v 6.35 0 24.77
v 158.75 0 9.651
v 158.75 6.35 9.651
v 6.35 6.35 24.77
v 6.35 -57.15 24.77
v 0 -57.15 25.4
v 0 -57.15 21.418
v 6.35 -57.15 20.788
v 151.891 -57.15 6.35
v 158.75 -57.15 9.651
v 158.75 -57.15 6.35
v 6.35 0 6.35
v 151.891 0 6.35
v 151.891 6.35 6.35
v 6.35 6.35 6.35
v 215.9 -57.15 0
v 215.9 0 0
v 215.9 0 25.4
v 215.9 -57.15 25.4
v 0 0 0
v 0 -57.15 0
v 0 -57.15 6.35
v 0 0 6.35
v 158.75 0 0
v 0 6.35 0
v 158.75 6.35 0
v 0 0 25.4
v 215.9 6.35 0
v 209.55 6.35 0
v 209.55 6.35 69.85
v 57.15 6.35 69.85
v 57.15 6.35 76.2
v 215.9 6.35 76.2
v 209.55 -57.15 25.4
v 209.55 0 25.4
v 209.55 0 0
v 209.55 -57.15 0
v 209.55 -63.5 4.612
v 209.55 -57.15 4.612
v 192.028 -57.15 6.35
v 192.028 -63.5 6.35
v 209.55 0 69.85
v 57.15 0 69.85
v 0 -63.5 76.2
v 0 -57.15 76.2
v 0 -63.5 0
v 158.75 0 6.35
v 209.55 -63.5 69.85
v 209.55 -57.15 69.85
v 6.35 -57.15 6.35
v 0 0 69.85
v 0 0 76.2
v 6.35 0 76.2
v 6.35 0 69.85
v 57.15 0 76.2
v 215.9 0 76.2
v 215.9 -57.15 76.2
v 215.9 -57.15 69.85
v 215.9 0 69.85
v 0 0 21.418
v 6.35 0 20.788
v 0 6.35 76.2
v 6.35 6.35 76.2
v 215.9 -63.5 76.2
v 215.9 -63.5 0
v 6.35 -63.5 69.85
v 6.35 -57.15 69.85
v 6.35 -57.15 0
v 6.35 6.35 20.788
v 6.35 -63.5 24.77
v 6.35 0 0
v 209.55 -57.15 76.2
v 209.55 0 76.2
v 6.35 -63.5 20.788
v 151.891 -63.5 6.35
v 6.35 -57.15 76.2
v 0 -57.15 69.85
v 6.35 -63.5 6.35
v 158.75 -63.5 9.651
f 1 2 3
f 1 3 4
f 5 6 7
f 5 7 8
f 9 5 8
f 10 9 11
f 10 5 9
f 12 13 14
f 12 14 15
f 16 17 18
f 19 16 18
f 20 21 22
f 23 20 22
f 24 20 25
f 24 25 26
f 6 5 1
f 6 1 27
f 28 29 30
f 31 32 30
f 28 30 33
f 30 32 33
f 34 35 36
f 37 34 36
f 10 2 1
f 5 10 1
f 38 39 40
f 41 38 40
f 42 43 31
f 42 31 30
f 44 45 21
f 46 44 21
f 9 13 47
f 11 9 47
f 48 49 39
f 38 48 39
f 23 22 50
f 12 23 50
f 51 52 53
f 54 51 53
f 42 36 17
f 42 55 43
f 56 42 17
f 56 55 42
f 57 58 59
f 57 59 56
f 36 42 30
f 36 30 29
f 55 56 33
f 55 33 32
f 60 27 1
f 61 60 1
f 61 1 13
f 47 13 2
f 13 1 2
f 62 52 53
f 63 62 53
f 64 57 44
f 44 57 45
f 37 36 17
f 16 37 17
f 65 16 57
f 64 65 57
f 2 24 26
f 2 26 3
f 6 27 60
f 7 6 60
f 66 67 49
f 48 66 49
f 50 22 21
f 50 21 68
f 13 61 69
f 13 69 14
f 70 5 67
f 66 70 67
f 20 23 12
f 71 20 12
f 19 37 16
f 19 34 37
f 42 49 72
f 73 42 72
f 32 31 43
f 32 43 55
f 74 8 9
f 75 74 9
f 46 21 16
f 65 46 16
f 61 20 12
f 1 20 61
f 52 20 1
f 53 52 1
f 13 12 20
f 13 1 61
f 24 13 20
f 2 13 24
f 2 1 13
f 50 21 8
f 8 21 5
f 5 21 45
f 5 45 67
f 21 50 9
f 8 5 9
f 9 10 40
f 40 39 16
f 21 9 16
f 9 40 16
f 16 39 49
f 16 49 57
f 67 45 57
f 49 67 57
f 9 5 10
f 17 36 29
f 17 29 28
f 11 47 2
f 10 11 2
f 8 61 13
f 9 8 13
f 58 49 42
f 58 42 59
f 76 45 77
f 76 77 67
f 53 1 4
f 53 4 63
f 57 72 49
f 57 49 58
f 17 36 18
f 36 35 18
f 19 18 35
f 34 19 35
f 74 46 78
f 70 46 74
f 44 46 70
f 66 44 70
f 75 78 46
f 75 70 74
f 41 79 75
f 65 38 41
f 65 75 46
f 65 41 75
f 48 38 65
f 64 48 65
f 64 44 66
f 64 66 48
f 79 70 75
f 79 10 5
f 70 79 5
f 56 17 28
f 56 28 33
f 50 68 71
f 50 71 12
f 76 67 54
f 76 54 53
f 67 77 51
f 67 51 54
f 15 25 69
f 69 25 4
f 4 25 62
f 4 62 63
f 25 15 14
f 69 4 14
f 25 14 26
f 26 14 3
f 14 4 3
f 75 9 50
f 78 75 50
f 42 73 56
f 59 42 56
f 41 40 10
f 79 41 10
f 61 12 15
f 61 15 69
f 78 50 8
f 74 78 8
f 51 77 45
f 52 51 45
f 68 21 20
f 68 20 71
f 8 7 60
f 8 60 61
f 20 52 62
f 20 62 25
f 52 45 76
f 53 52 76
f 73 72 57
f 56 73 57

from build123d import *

# Parameters (mm, degrees)
F0_W     = 6.35
F0_H     = 6.35
F1_DEPTH = 6.35
F0_H_2   = 44.45
F0_W_2   = 152.4
F2_START = 57.15
F0_W_3   = 50.8
F2_DEPTH = 6.35
F3_DEPTH = 57.15


with BuildPart() as f1:
    # F0 (on Front) → F1 (new body)
    with BuildSketch(Plane.XZ):
        Polygon((158.75, 9.6513603842), (6.35, 24.7700544154), (6.35, 20.7882042928), (151.8905030152, 6.35), (158.75, 6.35), align=None)
        Polygon((6.35, 24.7700544154), (0, 25.4), (0, 21.4181498774), (6.35, 20.7882042928), align=None)
        Polygon((6.35, 28.7519045379), (0, 29.3818501226), (0, 25.4), (6.35, 24.7700544154), align=None)
        Polygon((6.35, 69.85), (0, 69.85), (0, 29.3818501226), (6.35, 28.7519045379), align=None)
        with Locations((3.175, 73.025)):
            Rectangle(F0_W, F0_H)
        Polygon((6.35, 20.7882042928), (0, 21.4181498774), (0, 6.35), (6.35, 6.35), align=None)
        with Locations((3.175, 3.175)):
            Rectangle(F0_W, F0_H)
        Polygon((158.75, 6.35), (151.8905030152, 6.35), (158.75, 5.6695102617), align=None)
        Polygon((151.8905030152, 6.35), (6.35, 6.35), (6.35, 0), (158.75, 0), (158.75, 5.6695102617), align=None)
    extrude(amount=-F1_DEPTH)


with BuildPart() as f1b:
    # F0 (on Front) → F1, piece 2 (new body)
    with BuildSketch(Plane.XZ):
        with Locations((212.725, 73.025)):
            Rectangle(F0_W, F0_H)
        with Locations((212.725, 47.625)):
            Rectangle(F0_W, F0_H_2)
        Polygon((215.9, 25.4), (209.55, 25.4), (209.55, 8.5936458298), (215.9, 7.9637002451), align=None)
        Polygon((215.9, 7.9637002451), (209.55, 8.5936458298), (209.55, 6.35), (215.9, 6.35), align=None)
        Polygon((215.9, 6.35), (209.55, 6.35), (209.55, 4.6117957072), (215.9, 3.9818501226), align=None)
        Polygon((215.9, 0), (209.55, 0.6299455846), (209.55, 0), align=None)
        Polygon((215.9, 3.9818501226), (209.55, 4.6117957072), (209.55, 0.6299455846), (215.9, 0), align=None)
        with Locations((133.35, 73.025)):
            Rectangle(F0_W_2, F0_H)
    extrude(amount=-F1_DEPTH)


with BuildPart() as f2:
    # F0 (on Front) → F2 (new body)
    with BuildSketch(Plane.XZ.offset(F2_START)):
        Polygon((215.9, 3.9818501226), (209.55, 4.6117957072), (209.55, 0.6299455846), (215.9, 0), align=None)
        Polygon((215.9, 0), (209.55, 0.6299455846), (209.55, 0), align=None)
        Polygon((209.55, 0.6299455846), (158.75, 5.6695102617), (158.75, 0), (209.55, 0), align=None)
        Polygon((209.55, 4.6117957072), (192.0284909545, 6.35), (158.75, 6.35), (158.75, 5.6695102617), (209.55, 0.6299455846), align=None)
        Polygon((192.0284909545, 6.35), (158.75, 9.6513603842), (158.75, 6.35), align=None)
        Polygon((158.75, 9.6513603842), (6.35, 24.7700544154), (6.35, 20.7882042928), (151.8905030152, 6.35), (158.75, 6.35), align=None)
        Polygon((158.75, 6.35), (151.8905030152, 6.35), (158.75, 5.6695102617), align=None)
        Polygon((151.8905030152, 6.35), (6.35, 6.35), (6.35, 0), (158.75, 0), (158.75, 5.6695102617), align=None)
        Polygon((215.9, 25.4), (209.55, 25.4), (209.55, 8.5936458298), (215.9, 7.9637002451), align=None)
        Polygon((215.9, 6.35), (209.55, 6.35), (209.55, 4.6117957072), (215.9, 3.9818501226), align=None)
        Polygon((215.9, 7.9637002451), (209.55, 8.5936458298), (209.55, 6.35), (215.9, 6.35), align=None)
        with Locations((212.725, 47.625)):
            Rectangle(F0_W, F0_H_2)
        with Locations((212.725, 73.025)):
            Rectangle(F0_W, F0_H)
        with Locations((133.35, 73.025)):
            Rectangle(F0_W_2, F0_H)
        with Locations((3.175, 3.175)):
            Rectangle(F0_W, F0_H)
        Polygon((6.35, 20.7882042928), (0, 21.4181498774), (0, 6.35), (6.35, 6.35), align=None)
        Polygon((6.35, 24.7700544154), (0, 25.4), (0, 21.4181498774), (6.35, 20.7882042928), align=None)
        Polygon((6.35, 28.7519045379), (0, 29.3818501226), (0, 25.4), (6.35, 24.7700544154), align=None)
        Polygon((6.35, 69.85), (0, 69.85), (0, 29.3818501226), (6.35, 28.7519045379), align=None)
        with Locations((3.175, 73.025)):
            Rectangle(F0_W, F0_H)
        with Locations((31.75, 73.025)):
            Rectangle(F0_W_3, F0_H)
    extrude(amount=F2_DEPTH)


with BuildPart() as f3:
    # F0 (on Front) → F3 (new body)
    with BuildSketch(Plane.XZ):
        with Locations((212.725, 73.025)):
            Rectangle(F0_W, F0_H)
    extrude(amount=F3_DEPTH)


with BuildPart() as f3b:
    # F0 (on Front) → F3, piece 2 (new body)
    with BuildSketch(Plane.XZ):
        Polygon((215.9, 0), (209.55, 0.6299455846), (209.55, 0), align=None)
        Polygon((215.9, 3.9818501226), (209.55, 4.6117957072), (209.55, 0.6299455846), (215.9, 0), align=None)
        Polygon((215.9, 6.35), (209.55, 6.35), (209.55, 4.6117957072), (215.9, 3.9818501226), align=None)
        Polygon((215.9, 7.9637002451), (209.55, 8.5936458298), (209.55, 6.35), (215.9, 6.35), align=None)
        Polygon((215.9, 25.4), (209.55, 25.4), (209.55, 8.5936458298), (215.9, 7.9637002451), align=None)
    extrude(amount=F3_DEPTH)


with BuildPart() as f3c:
    # F0 (on Front) → F3, piece 3 (new body)
    with BuildSketch(Plane.XZ):
        with Locations((3.175, 73.025)):
            Rectangle(F0_W, F0_H)
    extrude(amount=F3_DEPTH)


with BuildPart() as f3d:
    # F0 (on Front) → F3, piece 4 (new body)
    with BuildSketch(Plane.XZ):
        with Locations((3.175, 3.175)):
            Rectangle(F0_W, F0_H)
    extrude(amount=F3_DEPTH)


with BuildPart() as f3e:
    # F0 (on Front) → F3, piece 5 (new body)
    with BuildSketch(Plane.XZ):
        Polygon((6.35, 24.7700544154), (0, 25.4), (0, 21.4181498774), (6.35, 20.7882042928), align=None)
        Polygon((158.75, 9.6513603842), (6.35, 24.7700544154), (6.35, 20.7882042928), (151.8905030152, 6.35), (158.75, 6.35), align=None)
    extrude(amount=F3_DEPTH)


solid = Compound([f1.part, f1b.part, f2.part, f3.part, f3b.part, f3c.part, f3d.part, f3e.part])
